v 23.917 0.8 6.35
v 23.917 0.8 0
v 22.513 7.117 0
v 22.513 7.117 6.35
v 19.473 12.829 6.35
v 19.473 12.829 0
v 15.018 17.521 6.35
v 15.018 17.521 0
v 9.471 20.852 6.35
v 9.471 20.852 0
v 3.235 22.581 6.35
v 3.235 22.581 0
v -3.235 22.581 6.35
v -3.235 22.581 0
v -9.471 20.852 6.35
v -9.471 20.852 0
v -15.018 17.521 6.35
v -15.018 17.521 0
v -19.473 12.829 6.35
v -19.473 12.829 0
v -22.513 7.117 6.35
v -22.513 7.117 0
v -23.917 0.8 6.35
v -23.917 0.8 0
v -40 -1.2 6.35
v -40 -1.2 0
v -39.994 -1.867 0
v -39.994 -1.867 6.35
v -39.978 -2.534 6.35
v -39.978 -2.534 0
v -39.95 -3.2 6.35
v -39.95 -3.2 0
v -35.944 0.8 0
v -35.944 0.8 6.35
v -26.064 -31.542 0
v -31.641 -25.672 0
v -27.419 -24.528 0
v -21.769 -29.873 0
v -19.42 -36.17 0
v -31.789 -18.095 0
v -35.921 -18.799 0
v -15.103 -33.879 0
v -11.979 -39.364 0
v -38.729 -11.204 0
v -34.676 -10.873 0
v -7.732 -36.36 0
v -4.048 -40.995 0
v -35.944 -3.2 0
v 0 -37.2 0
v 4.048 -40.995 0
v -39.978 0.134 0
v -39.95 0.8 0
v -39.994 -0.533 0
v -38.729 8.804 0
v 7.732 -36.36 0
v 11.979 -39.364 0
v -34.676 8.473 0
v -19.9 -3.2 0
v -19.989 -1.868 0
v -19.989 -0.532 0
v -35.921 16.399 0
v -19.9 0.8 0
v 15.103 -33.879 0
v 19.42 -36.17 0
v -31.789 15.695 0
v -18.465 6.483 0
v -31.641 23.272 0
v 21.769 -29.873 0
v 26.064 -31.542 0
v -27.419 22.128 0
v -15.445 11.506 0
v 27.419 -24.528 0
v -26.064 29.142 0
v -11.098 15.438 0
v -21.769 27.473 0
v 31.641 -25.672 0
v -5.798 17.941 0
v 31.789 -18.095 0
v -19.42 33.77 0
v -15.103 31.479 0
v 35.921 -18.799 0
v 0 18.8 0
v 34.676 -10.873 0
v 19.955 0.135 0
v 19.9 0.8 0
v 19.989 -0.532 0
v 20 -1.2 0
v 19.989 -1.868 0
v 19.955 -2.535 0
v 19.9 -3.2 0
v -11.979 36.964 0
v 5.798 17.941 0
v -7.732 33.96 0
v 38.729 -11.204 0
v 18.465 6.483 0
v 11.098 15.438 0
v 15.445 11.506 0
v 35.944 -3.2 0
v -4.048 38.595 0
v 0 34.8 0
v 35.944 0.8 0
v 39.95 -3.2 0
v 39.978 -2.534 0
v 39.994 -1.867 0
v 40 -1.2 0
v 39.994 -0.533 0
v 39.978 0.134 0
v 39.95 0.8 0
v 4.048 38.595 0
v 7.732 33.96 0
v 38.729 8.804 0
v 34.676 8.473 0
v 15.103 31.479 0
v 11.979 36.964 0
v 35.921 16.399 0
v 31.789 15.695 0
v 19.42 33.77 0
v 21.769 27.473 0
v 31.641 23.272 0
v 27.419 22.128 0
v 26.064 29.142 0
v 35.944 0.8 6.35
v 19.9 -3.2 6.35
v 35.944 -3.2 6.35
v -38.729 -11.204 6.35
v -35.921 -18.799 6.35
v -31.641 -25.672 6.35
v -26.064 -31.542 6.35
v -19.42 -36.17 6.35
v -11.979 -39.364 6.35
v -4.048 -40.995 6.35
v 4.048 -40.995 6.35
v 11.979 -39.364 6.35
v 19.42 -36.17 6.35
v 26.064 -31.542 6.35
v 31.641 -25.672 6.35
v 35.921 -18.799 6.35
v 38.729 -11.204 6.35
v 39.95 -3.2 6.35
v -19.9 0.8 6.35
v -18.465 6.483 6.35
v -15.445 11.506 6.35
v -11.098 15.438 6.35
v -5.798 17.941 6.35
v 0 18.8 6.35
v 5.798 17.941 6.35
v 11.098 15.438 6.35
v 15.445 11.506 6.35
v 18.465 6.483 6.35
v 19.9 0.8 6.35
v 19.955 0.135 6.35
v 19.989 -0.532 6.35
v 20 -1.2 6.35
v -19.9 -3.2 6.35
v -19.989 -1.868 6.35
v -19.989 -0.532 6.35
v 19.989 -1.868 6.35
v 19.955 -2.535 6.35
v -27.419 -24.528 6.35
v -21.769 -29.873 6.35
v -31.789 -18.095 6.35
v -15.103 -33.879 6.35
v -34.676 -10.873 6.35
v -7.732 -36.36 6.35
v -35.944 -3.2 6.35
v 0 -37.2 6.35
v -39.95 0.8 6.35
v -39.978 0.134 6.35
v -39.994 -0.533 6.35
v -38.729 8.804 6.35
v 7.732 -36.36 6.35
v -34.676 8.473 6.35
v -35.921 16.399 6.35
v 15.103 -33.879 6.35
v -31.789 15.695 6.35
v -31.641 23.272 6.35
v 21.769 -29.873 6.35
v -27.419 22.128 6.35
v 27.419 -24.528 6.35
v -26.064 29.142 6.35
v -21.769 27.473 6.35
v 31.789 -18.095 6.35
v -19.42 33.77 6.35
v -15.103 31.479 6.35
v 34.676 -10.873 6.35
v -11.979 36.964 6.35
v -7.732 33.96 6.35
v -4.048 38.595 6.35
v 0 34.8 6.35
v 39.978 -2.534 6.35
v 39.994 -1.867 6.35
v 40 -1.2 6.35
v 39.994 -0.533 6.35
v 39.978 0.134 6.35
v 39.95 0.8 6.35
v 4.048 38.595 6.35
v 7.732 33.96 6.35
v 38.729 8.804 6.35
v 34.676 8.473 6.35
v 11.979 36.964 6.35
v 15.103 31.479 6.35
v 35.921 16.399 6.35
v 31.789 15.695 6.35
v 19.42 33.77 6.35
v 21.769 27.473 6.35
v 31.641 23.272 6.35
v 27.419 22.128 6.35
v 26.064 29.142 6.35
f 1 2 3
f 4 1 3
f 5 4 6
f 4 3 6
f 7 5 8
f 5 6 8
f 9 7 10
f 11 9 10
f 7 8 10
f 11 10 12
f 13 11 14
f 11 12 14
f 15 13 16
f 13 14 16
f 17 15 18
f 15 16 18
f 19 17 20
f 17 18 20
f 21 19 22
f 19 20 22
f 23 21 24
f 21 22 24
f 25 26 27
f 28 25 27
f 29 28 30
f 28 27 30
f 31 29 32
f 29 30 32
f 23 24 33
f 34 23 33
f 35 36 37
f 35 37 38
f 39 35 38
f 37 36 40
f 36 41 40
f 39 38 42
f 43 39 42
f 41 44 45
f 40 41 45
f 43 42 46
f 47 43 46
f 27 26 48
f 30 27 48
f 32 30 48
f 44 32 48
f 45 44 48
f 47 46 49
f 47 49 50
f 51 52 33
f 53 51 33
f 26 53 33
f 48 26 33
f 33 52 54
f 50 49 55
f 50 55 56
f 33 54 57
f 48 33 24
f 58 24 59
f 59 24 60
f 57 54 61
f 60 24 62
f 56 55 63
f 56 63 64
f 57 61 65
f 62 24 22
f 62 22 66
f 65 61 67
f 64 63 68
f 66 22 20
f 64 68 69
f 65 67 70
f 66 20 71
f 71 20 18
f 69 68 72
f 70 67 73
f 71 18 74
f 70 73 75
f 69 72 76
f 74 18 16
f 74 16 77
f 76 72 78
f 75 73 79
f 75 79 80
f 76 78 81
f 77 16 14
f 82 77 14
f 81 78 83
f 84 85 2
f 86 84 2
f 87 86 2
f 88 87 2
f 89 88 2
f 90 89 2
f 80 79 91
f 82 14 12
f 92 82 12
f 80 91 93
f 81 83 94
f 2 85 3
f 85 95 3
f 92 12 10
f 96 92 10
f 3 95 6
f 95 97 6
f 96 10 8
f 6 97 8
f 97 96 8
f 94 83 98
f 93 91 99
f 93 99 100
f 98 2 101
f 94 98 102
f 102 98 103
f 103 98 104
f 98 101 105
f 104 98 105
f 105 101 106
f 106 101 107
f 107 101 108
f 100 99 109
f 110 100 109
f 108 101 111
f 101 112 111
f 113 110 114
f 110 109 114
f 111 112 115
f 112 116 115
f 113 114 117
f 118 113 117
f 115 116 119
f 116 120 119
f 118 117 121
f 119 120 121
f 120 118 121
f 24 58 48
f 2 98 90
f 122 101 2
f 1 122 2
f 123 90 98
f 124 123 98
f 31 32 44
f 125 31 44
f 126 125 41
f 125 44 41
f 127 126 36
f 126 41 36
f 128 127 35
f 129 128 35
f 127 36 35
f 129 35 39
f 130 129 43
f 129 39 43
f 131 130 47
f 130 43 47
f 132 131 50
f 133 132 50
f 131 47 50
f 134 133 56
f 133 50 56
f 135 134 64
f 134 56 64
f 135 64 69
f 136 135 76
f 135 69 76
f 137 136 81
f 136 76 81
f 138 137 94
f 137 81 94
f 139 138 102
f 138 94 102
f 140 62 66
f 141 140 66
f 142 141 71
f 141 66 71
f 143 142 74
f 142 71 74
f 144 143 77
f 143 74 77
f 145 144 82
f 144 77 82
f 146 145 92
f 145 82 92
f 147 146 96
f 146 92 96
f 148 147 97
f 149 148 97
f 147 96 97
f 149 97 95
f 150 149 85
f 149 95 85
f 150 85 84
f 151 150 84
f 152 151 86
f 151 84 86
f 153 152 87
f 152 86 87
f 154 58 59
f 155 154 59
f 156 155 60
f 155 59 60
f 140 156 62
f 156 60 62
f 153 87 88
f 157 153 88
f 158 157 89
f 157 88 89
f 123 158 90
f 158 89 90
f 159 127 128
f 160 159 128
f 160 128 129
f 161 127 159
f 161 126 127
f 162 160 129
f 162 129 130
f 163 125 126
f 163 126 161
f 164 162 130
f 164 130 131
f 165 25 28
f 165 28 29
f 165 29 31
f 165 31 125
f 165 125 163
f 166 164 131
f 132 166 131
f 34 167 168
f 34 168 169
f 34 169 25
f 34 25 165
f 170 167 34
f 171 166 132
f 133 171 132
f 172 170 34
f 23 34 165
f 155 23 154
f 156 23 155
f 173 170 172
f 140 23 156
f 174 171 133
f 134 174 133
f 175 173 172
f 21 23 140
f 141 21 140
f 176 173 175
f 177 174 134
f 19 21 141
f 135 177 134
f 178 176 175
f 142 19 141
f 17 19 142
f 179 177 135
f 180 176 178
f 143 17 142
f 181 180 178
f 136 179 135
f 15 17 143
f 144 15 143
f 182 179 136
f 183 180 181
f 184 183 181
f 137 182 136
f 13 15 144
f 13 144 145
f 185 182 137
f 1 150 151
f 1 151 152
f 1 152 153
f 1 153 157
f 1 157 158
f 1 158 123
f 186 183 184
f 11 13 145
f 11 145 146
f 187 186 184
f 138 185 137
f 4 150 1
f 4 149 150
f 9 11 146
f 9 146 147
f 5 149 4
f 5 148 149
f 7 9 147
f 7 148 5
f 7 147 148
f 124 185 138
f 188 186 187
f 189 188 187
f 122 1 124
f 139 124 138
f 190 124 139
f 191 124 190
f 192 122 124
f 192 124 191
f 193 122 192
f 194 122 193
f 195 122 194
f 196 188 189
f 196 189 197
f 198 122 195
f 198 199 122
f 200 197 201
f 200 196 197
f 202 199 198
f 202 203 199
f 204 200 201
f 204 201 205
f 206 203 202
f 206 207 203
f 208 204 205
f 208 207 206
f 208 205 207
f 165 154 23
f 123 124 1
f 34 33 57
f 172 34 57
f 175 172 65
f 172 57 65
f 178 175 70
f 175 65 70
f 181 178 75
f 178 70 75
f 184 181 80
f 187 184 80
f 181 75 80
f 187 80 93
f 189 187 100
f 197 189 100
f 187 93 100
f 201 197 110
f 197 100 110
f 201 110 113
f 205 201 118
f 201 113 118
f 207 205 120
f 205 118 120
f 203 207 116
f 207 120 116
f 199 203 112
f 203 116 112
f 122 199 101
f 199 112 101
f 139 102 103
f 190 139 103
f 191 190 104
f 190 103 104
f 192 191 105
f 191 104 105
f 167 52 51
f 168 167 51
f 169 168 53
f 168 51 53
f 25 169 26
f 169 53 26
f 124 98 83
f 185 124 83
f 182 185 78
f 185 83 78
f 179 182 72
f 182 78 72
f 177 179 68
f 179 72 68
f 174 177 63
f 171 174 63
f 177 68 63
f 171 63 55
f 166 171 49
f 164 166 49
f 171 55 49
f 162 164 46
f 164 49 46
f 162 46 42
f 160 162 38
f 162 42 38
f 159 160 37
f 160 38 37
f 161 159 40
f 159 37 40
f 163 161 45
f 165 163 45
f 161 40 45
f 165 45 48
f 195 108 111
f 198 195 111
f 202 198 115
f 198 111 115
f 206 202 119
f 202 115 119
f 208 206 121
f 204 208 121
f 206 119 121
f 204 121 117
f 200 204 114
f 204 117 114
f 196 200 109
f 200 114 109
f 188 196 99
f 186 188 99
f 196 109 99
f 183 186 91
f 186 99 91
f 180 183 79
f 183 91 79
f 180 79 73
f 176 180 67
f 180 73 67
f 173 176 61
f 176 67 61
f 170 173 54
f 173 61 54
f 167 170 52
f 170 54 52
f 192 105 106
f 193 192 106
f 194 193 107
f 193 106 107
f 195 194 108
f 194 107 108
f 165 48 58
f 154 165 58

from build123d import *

# Parameters (mm, degrees)
F1_DEPTH = 6.35


with BuildPart() as f1:
    # F0 (on Top) → F1 (new body)
    with BuildSketch(Plane.XY):
        with BuildLine():
            Line((35.9444015112, 0.8), (39.9499687109, 0.8))
            ThreePointArc((39.9499687109, 0.8), (0, 38.8), (-39.9499687109, 0.8))
            Line((-39.9499687109, 0.8), (-35.9444015112, 0.8))
            ThreePointArc((-35.9444015112, 0.8), (0, 34.8), (35.9444015112, 0.8))
        make_face()
        with BuildLine():
            Line((-35.9444015112, 0.8), (-39.9499687109, 0.8))
            ThreePointArc((-39.9499687109, 0.8), (-39.9874902215, -0.1996871577), (-40, -1.2))
            ThreePointArc((-40, -1.2), (-39.9874902215, -2.2003128423), (-39.9499687109, -3.2))
            Line((-39.9499687109, -3.2), (-35.9444015112, -3.2))
            ThreePointArc((-35.9444015112, -3.2), (-36, -1.2), (-35.9444015112, 0.8))
        make_face()
        with BuildLine():
            ThreePointArc((-39.9499687109, -3.2), (0, -41.2), (39.9499687109, -3.2))
            Line((39.9499687109, -3.2), (35.9444015112, -3.2))
            ThreePointArc((35.9444015112, -3.2), (0, -37.2), (-35.9444015112, -3.2))
            Line((-35.9444015112, -3.2), (-39.9499687109, -3.2))
        make_face()
        with BuildLine():
            ThreePointArc((39.9499687109, -3.2), (39.9874902215, -2.2003128423), (40, -1.2))
            ThreePointArc((40, -1.2), (39.9874902215, -0.1996871577), (39.9499687109, 0.8))
            Line((39.9499687109, 0.8), (35.9444015112, 0.8))
            ThreePointArc((35.9444015112, 0.8), (35.9860976934, -0.1996136756), (36, -1.2))
            ThreePointArc((36, -1.2), (35.9860976934, -2.2003863244), (35.9444015112, -3.2))
            Line((35.9444015112, -3.2), (39.9499687109, -3.2))
        make_face()
        with BuildLine():
            ThreePointArc((36, -1.2), (35.9860976934, -0.1996136756), (35.9444015112, 0.8))
            Line((35.9444015112, 0.8), (23.9165214862, 0.8))
            ThreePointArc((23.9165214862, 0.8), (23.9791212899, -0.1991292963), (24, -1.2))
            ThreePointArc((24, -1.2), (23.9791212899, -2.2008707037), (23.9165214862, -3.2))
            Line((23.9165214862, -3.2), (35.9444015112, -3.2))
            ThreePointArc((35.9444015112, -3.2), (35.9860976934, -2.2003863244), (36, -1.2))
        make_face()
        with BuildLine():
            ThreePointArc((24, -1.2), (23.9791212899, -0.1991292963), (23.9165214862, 0.8))
            Line((23.9165214862, 0.8), (19.8997487421, 0.8))
            ThreePointArc((19.8997487421, 0.8), (19.9749214622, -0.1987444988), (20, -1.2))
            ThreePointArc((20, -1.2), (19.9749214622, -2.2012555012), (19.8997487421, -3.2))
            Line((19.8997487421, -3.2), (23.9165214862, -3.2))
            ThreePointArc((23.9165214862, -3.2), (23.9791212899, -2.2008707037), (24, -1.2))
        make_face()
        with BuildLine():
            Line((19.8997487421, 0.8), (23.9165214862, 0.8))
            ThreePointArc((23.9165214862, 0.8), (0, 22.8), (-23.9165214862, 0.8))
            Line((-23.9165214862, 0.8), (-19.8997487421, 0.8))
            ThreePointArc((-19.8997487421, 0.8), (0, 18.8), (19.8997487421, 0.8))
        make_face()
        with BuildLine():
            Line((-19.8997487421, 0.8), (-23.9165214862, 0.8))
            ThreePointArc((-23.9165214862, 0.8), (-24, -1.2), (-23.9165214862, -3.2))
            Line((-23.9165214862, -3.2), (-19.8997487421, -3.2))
            ThreePointArc((-19.8997487421, -3.2), (-20, -1.2), (-19.8997487421, 0.8))
        make_face()
        with BuildLine():
            Line((-23.9165214862, 0.8), (-35.9444015112, 0.8))
            ThreePointArc((-35.9444015112, 0.8), (-36, -1.2), (-35.9444015112, -3.2))
            Line((-35.9444015112, -3.2), (-23.9165214862, -3.2))
            ThreePointArc((-23.9165214862, -3.2), (-24, -1.2), (-23.9165214862, 0.8))
        make_face()
    extrude(amount=F1_DEPTH)


solid = f1.part
